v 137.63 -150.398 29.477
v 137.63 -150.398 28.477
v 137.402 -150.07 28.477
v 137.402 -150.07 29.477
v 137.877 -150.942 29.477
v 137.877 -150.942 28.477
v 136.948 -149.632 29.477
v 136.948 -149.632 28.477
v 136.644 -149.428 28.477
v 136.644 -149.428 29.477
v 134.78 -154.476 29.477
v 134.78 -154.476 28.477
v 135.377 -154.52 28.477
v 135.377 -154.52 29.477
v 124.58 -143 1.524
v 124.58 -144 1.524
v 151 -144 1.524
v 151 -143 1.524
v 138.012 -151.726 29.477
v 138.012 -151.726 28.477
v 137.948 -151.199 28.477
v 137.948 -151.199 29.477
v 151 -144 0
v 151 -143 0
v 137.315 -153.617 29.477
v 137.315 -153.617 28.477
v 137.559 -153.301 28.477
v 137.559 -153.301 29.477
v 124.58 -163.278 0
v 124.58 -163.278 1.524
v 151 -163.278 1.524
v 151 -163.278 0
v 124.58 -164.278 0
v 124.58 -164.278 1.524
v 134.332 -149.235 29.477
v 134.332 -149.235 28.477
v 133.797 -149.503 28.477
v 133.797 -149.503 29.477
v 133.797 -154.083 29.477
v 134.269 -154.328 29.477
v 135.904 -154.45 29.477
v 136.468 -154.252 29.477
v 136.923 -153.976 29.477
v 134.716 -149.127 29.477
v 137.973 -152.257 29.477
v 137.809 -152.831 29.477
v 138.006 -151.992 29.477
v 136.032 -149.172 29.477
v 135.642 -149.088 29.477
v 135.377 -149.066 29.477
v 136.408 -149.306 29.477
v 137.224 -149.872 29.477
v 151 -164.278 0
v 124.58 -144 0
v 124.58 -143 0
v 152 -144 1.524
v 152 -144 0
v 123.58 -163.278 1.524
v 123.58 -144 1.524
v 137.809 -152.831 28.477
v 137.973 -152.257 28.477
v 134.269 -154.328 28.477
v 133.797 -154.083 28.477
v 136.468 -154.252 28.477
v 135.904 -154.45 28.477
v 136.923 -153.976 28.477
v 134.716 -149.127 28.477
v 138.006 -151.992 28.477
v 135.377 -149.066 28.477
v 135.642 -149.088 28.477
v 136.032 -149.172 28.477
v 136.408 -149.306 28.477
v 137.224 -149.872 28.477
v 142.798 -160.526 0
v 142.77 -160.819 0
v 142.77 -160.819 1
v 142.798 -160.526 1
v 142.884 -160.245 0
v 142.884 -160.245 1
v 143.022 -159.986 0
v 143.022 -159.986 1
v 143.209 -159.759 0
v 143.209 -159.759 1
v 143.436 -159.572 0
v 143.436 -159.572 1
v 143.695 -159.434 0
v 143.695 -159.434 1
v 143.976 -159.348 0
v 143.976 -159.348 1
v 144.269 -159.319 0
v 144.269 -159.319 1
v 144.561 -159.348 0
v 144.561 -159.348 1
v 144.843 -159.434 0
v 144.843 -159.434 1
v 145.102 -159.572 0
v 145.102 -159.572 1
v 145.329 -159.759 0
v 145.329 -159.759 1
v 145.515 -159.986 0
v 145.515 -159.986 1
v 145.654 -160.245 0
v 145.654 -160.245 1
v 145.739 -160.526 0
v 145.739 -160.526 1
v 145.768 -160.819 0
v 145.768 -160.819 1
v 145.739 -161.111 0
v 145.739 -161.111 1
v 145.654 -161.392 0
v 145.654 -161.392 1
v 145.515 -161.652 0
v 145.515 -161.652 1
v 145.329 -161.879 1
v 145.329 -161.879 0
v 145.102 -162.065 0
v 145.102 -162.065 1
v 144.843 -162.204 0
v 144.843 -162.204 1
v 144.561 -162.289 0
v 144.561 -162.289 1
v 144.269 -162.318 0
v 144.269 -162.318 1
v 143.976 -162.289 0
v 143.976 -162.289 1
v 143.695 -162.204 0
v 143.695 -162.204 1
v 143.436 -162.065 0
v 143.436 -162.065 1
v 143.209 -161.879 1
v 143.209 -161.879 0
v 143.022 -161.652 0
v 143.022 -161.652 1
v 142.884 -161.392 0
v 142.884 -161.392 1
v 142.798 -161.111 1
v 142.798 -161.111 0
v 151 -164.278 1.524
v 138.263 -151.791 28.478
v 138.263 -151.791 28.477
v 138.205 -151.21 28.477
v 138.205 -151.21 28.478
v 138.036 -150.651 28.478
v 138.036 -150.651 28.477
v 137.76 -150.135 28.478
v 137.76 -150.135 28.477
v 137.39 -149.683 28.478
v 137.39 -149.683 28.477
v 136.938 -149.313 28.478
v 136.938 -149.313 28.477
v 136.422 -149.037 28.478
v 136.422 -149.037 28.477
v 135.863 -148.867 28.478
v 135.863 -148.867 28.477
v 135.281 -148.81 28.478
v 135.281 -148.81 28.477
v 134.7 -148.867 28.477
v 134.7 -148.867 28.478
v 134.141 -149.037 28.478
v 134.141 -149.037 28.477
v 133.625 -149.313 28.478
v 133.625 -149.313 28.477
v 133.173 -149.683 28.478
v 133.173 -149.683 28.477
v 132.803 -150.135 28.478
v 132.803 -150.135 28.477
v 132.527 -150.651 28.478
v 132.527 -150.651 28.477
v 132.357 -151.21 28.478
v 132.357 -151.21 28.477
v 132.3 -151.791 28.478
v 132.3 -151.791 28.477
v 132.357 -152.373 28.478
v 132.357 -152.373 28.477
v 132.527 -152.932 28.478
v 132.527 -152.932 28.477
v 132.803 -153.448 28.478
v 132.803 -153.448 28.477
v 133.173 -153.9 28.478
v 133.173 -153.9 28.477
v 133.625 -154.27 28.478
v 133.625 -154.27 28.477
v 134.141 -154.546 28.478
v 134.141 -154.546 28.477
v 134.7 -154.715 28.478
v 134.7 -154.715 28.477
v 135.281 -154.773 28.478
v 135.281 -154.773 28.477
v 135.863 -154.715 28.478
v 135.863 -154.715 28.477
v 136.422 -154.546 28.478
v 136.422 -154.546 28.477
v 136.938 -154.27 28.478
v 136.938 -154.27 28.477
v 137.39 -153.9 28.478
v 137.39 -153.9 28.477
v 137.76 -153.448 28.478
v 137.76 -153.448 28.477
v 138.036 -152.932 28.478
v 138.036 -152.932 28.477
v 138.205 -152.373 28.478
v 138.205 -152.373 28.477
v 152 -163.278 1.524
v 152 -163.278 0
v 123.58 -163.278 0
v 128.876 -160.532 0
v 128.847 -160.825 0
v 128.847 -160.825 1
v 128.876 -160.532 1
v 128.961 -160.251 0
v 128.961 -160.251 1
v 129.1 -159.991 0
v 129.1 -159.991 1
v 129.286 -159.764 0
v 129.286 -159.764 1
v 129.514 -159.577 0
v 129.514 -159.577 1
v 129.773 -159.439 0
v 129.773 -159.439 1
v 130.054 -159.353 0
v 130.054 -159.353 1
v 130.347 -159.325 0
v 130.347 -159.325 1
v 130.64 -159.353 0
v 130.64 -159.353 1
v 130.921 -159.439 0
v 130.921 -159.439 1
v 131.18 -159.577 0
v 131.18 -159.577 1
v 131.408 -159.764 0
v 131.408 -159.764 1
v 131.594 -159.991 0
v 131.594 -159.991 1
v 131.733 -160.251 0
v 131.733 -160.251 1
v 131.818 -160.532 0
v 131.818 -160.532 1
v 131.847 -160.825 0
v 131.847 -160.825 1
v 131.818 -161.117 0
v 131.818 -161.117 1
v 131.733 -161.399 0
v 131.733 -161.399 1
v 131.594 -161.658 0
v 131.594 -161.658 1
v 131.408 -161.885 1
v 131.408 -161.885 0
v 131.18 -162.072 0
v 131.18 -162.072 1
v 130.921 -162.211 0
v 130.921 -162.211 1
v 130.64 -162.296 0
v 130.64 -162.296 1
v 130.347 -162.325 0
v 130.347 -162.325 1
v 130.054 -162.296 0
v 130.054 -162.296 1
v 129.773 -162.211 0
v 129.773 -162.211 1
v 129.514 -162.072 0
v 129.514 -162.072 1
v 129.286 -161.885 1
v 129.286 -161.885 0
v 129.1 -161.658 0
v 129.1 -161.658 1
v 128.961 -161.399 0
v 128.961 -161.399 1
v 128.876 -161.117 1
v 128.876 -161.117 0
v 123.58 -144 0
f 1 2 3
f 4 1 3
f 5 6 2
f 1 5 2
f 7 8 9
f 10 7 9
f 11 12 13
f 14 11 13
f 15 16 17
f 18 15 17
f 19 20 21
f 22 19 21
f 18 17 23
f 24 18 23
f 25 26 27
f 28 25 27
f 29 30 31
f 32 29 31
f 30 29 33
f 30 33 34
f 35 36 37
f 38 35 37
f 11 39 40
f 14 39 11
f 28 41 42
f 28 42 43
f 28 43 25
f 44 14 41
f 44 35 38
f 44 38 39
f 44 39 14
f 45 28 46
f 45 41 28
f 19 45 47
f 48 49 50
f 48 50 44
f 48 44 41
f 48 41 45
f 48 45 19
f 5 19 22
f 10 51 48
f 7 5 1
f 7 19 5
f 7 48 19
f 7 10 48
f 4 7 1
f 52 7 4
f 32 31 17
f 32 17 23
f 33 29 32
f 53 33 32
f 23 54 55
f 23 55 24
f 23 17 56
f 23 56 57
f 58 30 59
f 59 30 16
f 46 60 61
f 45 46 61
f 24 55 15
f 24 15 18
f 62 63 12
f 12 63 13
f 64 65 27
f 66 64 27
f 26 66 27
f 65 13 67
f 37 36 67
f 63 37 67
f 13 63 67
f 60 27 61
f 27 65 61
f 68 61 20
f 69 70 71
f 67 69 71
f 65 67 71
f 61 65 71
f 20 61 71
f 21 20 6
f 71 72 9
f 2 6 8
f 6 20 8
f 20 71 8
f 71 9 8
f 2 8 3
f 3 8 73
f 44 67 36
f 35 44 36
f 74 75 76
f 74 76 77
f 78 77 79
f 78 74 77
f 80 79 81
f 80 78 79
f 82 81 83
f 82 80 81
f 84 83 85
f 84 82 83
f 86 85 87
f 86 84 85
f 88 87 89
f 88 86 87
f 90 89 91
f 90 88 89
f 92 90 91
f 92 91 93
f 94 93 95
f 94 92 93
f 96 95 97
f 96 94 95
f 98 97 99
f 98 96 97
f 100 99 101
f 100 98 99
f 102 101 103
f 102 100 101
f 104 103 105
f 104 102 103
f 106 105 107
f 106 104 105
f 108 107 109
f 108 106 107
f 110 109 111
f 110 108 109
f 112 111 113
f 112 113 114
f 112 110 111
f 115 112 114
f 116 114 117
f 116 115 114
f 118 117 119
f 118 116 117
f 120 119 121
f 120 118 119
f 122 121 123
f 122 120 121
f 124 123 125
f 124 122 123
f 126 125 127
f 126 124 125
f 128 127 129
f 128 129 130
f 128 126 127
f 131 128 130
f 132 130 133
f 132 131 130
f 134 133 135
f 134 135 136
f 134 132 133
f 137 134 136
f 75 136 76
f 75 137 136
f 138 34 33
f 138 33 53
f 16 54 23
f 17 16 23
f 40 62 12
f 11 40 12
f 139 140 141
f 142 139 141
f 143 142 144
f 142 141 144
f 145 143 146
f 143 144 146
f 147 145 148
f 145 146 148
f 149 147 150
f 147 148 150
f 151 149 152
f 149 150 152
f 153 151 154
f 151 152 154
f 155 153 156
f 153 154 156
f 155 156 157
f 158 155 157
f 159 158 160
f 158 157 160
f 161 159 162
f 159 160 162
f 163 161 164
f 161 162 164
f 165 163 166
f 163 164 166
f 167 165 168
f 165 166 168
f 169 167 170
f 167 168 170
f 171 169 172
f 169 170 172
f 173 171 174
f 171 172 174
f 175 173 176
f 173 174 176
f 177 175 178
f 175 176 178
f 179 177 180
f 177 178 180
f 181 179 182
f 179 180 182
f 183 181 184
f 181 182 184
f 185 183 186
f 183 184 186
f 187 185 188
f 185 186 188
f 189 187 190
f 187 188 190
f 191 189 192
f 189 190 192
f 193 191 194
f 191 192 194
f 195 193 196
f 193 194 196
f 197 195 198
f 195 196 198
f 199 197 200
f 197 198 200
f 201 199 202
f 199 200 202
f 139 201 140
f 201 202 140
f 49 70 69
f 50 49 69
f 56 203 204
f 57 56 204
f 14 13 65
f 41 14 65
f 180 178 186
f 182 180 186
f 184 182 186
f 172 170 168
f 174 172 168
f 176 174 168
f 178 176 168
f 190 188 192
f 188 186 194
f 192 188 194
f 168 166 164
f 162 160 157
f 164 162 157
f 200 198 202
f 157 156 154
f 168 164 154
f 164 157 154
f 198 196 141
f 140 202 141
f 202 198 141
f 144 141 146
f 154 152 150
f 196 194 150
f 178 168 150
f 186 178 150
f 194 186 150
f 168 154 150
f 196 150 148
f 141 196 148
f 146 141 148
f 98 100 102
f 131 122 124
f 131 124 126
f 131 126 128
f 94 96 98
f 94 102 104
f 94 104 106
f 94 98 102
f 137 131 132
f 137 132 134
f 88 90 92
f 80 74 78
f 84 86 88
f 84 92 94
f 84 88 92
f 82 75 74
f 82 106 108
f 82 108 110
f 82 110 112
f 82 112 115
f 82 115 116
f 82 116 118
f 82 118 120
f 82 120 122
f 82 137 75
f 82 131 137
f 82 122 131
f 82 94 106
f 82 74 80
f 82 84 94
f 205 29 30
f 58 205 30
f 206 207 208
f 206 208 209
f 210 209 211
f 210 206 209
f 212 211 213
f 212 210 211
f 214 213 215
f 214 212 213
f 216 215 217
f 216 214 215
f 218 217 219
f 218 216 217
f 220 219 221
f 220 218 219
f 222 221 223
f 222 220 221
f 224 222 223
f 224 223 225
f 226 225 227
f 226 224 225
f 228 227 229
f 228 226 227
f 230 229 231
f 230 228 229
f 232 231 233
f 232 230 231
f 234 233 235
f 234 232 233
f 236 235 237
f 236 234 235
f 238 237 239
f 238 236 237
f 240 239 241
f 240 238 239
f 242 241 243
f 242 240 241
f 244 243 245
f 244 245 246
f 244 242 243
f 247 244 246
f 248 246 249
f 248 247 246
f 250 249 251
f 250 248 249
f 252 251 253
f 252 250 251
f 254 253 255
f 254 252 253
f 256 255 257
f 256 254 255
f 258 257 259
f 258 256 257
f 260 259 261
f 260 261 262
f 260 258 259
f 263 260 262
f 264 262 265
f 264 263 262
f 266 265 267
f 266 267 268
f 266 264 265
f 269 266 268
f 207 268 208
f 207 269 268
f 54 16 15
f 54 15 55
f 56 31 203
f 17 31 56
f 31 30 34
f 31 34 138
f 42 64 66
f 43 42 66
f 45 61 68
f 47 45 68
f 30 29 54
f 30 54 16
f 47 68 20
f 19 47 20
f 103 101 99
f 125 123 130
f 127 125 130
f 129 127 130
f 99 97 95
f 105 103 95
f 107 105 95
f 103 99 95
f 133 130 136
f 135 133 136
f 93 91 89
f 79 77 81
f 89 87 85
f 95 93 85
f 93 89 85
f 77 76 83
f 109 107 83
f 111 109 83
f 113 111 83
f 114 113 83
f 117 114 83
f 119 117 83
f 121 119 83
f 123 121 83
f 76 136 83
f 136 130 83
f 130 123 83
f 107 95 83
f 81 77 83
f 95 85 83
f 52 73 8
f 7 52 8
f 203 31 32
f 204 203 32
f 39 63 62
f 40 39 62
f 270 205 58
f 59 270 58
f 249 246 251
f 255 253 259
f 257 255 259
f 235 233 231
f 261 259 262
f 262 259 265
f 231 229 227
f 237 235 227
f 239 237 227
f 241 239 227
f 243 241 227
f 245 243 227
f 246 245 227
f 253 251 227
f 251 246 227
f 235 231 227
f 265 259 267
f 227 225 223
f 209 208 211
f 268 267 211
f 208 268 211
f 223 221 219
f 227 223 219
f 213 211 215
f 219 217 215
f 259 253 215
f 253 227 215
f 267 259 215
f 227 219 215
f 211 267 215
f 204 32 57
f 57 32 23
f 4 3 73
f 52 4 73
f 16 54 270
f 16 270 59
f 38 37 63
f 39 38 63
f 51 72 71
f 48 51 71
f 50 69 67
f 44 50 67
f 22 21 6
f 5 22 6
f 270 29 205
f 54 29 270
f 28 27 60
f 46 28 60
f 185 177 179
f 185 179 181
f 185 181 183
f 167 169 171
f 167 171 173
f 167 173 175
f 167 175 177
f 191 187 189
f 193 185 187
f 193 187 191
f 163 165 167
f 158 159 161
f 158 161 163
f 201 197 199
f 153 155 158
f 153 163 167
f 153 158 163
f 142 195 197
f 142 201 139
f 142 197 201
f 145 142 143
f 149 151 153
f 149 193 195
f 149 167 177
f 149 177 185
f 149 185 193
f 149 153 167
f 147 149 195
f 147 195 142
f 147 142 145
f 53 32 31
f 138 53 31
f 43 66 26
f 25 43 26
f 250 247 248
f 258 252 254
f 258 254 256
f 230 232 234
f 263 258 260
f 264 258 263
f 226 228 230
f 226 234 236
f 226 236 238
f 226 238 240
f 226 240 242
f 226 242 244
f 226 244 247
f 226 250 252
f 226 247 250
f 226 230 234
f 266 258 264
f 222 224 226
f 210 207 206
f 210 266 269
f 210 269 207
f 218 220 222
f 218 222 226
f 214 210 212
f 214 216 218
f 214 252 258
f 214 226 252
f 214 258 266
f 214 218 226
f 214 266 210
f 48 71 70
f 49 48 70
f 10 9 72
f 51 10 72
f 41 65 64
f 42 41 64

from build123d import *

# Parameters (mm, degrees)
SKETCH2_R               = 2.981293854
ENCODERAXISATTACH_DEPTH = 0.001
SKETCH3_W               = 1.524000079
SKETCH3_H               = 19.278004866
BOSS_EXTRUDE3_DEPTH     = 1
SKETCH4_W               = 26.419990765
SKETCH4_H               = 1.524000079
BOSS_EXTRUDE4_DEPTH     = 1
SKETCH6_W               = 1.524000079
SKETCH6_H               = 19.278005766
BOSS_EXTRUDE5_DEPTH     = 1
SKETCH7_W               = 26.419990765
SKETCH7_H               = 1.524000079
BOSS_EXTRUDE6_DEPTH     = 1
BOSS_EXTRUDE1_DEPTH     = 1
SKETCH8_R               = 1.499263455
BOSS_EXTRUDE7_DEPTH     = 1
SKETCH8_R_2             = 1.500016471
BOSS_EXTRUDE7_2_DEPTH   = 1


# Read off the part's stored shape, not the designer's step: Surface-Imported1
with BuildPart() as part:
    # Sketch2 → encoderaxisattach (new body)
    with BuildSketch(Plane.XY.offset(28.477000073)):
        with Locations((135.281426774, -151.791471956)):
            Circle(SKETCH2_R)
    extrude(amount=ENCODERAXISATTACH_DEPTH)


with BuildPart() as body_2:
    # Sketch3 → Boss-Extrude3 (new body)
    with BuildSketch(Plane.ZY.offset(-124.580003321)):
        with Locations((0.76200004, -153.638996134)):
            Rectangle(SKETCH3_W, SKETCH3_H)
    extrude(amount=BOSS_EXTRUDE3_DEPTH)


with BuildPart() as body_3:
    # Sketch4 → Boss-Extrude4 (new body)
    with BuildSketch(Plane(origin=(0, -143.999993801, 0), x_dir=(1, 0, 0), z_dir=(0, 1, 0))):
        with Locations((137.789998704, -0.76200004)):
            Rectangle(SKETCH4_W, SKETCH4_H)
    extrude(amount=BOSS_EXTRUDE4_DEPTH)


with BuildPart() as body_4:
    # Sketch6 → Boss-Extrude5 (new body)
    with BuildSketch(Plane(origin=(150.999993086, 0, 0), x_dir=(0, 0, -1), z_dir=(1, 0, 0))):
        with Locations((-0.76200004, -153.638996684)):
            Rectangle(SKETCH6_W, SKETCH6_H)
    extrude(amount=BOSS_EXTRUDE5_DEPTH)


with BuildPart() as body_5:
    # Sketch7 → Boss-Extrude6 (new body)
    with BuildSketch(Plane.XZ.offset(163.277998567)):
        with Locations((137.789997704, 0.76200004)):
            Rectangle(SKETCH7_W, SKETCH7_H)
    extrude(amount=BOSS_EXTRUDE6_DEPTH)


with BuildPart() as body_6:
    # Sketch1 → Boss-Extrude1 (new body)
    with BuildSketch(Plane.XY.offset(28.477000073)):
        Polygon((133.796989918, -154.082998633), (134.2689991, -154.328003526), (134.780004621, -154.476001859), (135.377004743, -154.520004988), (135.904014111, -154.449999332), (136.468008161, -154.251992702), (136.923000216, -153.975993395), (137.315005064, -153.617009521), (137.559011579, -153.301000595), (137.80900836, -152.830988169), (137.97301054, -152.257010341), (138.006001711, -151.99200809), (138.011991978, -151.72599256), (137.94799149, -151.198998094), (137.877002358, -150.941997766), (137.63000071, -150.398001075), (137.401998043, -150.070011616), (137.224003673, -149.871990085), (136.948004365, -149.632006884), (136.643990874, -149.427995086), (136.408001184, -149.305999279), (136.032000184, -149.171993136), (135.641992092, -149.087995291), (135.377004743, -149.066001177), (134.716004133, -149.12699163), (134.332001209, -149.234995246), (133.796989918, -149.503007531), align=None)
    extrude(amount=BOSS_EXTRUDE1_DEPTH)


with BuildPart() as body_7:
    # Sketch8 → Boss-Extrude7 (new body)
    with BuildSketch(Plane(origin=(0, 0, 0), x_dir=(-1, 0, 0), z_dir=(0, 0, -1))):
        with Locations((-144.26888852, -160.818724299)):
            Circle(SKETCH8_R)
    extrude(amount=-BOSS_EXTRUDE7_DEPTH)


with BuildPart() as body_8:
    # Sketch8 → Boss-Extrude7 2 (new body)
    with BuildSketch(Plane(origin=(0, 0, 0), x_dir=(-1, 0, 0), z_dir=(0, 0, -1))):
        with Locations((-130.346982161, -160.824667911)):
            Circle(SKETCH8_R_2)
    extrude(amount=-BOSS_EXTRUDE7_2_DEPTH)


solid = Compound([part.part, body_2.part, body_3.part, body_4.part, body_5.part, body_6.part, body_7.part, body_8.part])
